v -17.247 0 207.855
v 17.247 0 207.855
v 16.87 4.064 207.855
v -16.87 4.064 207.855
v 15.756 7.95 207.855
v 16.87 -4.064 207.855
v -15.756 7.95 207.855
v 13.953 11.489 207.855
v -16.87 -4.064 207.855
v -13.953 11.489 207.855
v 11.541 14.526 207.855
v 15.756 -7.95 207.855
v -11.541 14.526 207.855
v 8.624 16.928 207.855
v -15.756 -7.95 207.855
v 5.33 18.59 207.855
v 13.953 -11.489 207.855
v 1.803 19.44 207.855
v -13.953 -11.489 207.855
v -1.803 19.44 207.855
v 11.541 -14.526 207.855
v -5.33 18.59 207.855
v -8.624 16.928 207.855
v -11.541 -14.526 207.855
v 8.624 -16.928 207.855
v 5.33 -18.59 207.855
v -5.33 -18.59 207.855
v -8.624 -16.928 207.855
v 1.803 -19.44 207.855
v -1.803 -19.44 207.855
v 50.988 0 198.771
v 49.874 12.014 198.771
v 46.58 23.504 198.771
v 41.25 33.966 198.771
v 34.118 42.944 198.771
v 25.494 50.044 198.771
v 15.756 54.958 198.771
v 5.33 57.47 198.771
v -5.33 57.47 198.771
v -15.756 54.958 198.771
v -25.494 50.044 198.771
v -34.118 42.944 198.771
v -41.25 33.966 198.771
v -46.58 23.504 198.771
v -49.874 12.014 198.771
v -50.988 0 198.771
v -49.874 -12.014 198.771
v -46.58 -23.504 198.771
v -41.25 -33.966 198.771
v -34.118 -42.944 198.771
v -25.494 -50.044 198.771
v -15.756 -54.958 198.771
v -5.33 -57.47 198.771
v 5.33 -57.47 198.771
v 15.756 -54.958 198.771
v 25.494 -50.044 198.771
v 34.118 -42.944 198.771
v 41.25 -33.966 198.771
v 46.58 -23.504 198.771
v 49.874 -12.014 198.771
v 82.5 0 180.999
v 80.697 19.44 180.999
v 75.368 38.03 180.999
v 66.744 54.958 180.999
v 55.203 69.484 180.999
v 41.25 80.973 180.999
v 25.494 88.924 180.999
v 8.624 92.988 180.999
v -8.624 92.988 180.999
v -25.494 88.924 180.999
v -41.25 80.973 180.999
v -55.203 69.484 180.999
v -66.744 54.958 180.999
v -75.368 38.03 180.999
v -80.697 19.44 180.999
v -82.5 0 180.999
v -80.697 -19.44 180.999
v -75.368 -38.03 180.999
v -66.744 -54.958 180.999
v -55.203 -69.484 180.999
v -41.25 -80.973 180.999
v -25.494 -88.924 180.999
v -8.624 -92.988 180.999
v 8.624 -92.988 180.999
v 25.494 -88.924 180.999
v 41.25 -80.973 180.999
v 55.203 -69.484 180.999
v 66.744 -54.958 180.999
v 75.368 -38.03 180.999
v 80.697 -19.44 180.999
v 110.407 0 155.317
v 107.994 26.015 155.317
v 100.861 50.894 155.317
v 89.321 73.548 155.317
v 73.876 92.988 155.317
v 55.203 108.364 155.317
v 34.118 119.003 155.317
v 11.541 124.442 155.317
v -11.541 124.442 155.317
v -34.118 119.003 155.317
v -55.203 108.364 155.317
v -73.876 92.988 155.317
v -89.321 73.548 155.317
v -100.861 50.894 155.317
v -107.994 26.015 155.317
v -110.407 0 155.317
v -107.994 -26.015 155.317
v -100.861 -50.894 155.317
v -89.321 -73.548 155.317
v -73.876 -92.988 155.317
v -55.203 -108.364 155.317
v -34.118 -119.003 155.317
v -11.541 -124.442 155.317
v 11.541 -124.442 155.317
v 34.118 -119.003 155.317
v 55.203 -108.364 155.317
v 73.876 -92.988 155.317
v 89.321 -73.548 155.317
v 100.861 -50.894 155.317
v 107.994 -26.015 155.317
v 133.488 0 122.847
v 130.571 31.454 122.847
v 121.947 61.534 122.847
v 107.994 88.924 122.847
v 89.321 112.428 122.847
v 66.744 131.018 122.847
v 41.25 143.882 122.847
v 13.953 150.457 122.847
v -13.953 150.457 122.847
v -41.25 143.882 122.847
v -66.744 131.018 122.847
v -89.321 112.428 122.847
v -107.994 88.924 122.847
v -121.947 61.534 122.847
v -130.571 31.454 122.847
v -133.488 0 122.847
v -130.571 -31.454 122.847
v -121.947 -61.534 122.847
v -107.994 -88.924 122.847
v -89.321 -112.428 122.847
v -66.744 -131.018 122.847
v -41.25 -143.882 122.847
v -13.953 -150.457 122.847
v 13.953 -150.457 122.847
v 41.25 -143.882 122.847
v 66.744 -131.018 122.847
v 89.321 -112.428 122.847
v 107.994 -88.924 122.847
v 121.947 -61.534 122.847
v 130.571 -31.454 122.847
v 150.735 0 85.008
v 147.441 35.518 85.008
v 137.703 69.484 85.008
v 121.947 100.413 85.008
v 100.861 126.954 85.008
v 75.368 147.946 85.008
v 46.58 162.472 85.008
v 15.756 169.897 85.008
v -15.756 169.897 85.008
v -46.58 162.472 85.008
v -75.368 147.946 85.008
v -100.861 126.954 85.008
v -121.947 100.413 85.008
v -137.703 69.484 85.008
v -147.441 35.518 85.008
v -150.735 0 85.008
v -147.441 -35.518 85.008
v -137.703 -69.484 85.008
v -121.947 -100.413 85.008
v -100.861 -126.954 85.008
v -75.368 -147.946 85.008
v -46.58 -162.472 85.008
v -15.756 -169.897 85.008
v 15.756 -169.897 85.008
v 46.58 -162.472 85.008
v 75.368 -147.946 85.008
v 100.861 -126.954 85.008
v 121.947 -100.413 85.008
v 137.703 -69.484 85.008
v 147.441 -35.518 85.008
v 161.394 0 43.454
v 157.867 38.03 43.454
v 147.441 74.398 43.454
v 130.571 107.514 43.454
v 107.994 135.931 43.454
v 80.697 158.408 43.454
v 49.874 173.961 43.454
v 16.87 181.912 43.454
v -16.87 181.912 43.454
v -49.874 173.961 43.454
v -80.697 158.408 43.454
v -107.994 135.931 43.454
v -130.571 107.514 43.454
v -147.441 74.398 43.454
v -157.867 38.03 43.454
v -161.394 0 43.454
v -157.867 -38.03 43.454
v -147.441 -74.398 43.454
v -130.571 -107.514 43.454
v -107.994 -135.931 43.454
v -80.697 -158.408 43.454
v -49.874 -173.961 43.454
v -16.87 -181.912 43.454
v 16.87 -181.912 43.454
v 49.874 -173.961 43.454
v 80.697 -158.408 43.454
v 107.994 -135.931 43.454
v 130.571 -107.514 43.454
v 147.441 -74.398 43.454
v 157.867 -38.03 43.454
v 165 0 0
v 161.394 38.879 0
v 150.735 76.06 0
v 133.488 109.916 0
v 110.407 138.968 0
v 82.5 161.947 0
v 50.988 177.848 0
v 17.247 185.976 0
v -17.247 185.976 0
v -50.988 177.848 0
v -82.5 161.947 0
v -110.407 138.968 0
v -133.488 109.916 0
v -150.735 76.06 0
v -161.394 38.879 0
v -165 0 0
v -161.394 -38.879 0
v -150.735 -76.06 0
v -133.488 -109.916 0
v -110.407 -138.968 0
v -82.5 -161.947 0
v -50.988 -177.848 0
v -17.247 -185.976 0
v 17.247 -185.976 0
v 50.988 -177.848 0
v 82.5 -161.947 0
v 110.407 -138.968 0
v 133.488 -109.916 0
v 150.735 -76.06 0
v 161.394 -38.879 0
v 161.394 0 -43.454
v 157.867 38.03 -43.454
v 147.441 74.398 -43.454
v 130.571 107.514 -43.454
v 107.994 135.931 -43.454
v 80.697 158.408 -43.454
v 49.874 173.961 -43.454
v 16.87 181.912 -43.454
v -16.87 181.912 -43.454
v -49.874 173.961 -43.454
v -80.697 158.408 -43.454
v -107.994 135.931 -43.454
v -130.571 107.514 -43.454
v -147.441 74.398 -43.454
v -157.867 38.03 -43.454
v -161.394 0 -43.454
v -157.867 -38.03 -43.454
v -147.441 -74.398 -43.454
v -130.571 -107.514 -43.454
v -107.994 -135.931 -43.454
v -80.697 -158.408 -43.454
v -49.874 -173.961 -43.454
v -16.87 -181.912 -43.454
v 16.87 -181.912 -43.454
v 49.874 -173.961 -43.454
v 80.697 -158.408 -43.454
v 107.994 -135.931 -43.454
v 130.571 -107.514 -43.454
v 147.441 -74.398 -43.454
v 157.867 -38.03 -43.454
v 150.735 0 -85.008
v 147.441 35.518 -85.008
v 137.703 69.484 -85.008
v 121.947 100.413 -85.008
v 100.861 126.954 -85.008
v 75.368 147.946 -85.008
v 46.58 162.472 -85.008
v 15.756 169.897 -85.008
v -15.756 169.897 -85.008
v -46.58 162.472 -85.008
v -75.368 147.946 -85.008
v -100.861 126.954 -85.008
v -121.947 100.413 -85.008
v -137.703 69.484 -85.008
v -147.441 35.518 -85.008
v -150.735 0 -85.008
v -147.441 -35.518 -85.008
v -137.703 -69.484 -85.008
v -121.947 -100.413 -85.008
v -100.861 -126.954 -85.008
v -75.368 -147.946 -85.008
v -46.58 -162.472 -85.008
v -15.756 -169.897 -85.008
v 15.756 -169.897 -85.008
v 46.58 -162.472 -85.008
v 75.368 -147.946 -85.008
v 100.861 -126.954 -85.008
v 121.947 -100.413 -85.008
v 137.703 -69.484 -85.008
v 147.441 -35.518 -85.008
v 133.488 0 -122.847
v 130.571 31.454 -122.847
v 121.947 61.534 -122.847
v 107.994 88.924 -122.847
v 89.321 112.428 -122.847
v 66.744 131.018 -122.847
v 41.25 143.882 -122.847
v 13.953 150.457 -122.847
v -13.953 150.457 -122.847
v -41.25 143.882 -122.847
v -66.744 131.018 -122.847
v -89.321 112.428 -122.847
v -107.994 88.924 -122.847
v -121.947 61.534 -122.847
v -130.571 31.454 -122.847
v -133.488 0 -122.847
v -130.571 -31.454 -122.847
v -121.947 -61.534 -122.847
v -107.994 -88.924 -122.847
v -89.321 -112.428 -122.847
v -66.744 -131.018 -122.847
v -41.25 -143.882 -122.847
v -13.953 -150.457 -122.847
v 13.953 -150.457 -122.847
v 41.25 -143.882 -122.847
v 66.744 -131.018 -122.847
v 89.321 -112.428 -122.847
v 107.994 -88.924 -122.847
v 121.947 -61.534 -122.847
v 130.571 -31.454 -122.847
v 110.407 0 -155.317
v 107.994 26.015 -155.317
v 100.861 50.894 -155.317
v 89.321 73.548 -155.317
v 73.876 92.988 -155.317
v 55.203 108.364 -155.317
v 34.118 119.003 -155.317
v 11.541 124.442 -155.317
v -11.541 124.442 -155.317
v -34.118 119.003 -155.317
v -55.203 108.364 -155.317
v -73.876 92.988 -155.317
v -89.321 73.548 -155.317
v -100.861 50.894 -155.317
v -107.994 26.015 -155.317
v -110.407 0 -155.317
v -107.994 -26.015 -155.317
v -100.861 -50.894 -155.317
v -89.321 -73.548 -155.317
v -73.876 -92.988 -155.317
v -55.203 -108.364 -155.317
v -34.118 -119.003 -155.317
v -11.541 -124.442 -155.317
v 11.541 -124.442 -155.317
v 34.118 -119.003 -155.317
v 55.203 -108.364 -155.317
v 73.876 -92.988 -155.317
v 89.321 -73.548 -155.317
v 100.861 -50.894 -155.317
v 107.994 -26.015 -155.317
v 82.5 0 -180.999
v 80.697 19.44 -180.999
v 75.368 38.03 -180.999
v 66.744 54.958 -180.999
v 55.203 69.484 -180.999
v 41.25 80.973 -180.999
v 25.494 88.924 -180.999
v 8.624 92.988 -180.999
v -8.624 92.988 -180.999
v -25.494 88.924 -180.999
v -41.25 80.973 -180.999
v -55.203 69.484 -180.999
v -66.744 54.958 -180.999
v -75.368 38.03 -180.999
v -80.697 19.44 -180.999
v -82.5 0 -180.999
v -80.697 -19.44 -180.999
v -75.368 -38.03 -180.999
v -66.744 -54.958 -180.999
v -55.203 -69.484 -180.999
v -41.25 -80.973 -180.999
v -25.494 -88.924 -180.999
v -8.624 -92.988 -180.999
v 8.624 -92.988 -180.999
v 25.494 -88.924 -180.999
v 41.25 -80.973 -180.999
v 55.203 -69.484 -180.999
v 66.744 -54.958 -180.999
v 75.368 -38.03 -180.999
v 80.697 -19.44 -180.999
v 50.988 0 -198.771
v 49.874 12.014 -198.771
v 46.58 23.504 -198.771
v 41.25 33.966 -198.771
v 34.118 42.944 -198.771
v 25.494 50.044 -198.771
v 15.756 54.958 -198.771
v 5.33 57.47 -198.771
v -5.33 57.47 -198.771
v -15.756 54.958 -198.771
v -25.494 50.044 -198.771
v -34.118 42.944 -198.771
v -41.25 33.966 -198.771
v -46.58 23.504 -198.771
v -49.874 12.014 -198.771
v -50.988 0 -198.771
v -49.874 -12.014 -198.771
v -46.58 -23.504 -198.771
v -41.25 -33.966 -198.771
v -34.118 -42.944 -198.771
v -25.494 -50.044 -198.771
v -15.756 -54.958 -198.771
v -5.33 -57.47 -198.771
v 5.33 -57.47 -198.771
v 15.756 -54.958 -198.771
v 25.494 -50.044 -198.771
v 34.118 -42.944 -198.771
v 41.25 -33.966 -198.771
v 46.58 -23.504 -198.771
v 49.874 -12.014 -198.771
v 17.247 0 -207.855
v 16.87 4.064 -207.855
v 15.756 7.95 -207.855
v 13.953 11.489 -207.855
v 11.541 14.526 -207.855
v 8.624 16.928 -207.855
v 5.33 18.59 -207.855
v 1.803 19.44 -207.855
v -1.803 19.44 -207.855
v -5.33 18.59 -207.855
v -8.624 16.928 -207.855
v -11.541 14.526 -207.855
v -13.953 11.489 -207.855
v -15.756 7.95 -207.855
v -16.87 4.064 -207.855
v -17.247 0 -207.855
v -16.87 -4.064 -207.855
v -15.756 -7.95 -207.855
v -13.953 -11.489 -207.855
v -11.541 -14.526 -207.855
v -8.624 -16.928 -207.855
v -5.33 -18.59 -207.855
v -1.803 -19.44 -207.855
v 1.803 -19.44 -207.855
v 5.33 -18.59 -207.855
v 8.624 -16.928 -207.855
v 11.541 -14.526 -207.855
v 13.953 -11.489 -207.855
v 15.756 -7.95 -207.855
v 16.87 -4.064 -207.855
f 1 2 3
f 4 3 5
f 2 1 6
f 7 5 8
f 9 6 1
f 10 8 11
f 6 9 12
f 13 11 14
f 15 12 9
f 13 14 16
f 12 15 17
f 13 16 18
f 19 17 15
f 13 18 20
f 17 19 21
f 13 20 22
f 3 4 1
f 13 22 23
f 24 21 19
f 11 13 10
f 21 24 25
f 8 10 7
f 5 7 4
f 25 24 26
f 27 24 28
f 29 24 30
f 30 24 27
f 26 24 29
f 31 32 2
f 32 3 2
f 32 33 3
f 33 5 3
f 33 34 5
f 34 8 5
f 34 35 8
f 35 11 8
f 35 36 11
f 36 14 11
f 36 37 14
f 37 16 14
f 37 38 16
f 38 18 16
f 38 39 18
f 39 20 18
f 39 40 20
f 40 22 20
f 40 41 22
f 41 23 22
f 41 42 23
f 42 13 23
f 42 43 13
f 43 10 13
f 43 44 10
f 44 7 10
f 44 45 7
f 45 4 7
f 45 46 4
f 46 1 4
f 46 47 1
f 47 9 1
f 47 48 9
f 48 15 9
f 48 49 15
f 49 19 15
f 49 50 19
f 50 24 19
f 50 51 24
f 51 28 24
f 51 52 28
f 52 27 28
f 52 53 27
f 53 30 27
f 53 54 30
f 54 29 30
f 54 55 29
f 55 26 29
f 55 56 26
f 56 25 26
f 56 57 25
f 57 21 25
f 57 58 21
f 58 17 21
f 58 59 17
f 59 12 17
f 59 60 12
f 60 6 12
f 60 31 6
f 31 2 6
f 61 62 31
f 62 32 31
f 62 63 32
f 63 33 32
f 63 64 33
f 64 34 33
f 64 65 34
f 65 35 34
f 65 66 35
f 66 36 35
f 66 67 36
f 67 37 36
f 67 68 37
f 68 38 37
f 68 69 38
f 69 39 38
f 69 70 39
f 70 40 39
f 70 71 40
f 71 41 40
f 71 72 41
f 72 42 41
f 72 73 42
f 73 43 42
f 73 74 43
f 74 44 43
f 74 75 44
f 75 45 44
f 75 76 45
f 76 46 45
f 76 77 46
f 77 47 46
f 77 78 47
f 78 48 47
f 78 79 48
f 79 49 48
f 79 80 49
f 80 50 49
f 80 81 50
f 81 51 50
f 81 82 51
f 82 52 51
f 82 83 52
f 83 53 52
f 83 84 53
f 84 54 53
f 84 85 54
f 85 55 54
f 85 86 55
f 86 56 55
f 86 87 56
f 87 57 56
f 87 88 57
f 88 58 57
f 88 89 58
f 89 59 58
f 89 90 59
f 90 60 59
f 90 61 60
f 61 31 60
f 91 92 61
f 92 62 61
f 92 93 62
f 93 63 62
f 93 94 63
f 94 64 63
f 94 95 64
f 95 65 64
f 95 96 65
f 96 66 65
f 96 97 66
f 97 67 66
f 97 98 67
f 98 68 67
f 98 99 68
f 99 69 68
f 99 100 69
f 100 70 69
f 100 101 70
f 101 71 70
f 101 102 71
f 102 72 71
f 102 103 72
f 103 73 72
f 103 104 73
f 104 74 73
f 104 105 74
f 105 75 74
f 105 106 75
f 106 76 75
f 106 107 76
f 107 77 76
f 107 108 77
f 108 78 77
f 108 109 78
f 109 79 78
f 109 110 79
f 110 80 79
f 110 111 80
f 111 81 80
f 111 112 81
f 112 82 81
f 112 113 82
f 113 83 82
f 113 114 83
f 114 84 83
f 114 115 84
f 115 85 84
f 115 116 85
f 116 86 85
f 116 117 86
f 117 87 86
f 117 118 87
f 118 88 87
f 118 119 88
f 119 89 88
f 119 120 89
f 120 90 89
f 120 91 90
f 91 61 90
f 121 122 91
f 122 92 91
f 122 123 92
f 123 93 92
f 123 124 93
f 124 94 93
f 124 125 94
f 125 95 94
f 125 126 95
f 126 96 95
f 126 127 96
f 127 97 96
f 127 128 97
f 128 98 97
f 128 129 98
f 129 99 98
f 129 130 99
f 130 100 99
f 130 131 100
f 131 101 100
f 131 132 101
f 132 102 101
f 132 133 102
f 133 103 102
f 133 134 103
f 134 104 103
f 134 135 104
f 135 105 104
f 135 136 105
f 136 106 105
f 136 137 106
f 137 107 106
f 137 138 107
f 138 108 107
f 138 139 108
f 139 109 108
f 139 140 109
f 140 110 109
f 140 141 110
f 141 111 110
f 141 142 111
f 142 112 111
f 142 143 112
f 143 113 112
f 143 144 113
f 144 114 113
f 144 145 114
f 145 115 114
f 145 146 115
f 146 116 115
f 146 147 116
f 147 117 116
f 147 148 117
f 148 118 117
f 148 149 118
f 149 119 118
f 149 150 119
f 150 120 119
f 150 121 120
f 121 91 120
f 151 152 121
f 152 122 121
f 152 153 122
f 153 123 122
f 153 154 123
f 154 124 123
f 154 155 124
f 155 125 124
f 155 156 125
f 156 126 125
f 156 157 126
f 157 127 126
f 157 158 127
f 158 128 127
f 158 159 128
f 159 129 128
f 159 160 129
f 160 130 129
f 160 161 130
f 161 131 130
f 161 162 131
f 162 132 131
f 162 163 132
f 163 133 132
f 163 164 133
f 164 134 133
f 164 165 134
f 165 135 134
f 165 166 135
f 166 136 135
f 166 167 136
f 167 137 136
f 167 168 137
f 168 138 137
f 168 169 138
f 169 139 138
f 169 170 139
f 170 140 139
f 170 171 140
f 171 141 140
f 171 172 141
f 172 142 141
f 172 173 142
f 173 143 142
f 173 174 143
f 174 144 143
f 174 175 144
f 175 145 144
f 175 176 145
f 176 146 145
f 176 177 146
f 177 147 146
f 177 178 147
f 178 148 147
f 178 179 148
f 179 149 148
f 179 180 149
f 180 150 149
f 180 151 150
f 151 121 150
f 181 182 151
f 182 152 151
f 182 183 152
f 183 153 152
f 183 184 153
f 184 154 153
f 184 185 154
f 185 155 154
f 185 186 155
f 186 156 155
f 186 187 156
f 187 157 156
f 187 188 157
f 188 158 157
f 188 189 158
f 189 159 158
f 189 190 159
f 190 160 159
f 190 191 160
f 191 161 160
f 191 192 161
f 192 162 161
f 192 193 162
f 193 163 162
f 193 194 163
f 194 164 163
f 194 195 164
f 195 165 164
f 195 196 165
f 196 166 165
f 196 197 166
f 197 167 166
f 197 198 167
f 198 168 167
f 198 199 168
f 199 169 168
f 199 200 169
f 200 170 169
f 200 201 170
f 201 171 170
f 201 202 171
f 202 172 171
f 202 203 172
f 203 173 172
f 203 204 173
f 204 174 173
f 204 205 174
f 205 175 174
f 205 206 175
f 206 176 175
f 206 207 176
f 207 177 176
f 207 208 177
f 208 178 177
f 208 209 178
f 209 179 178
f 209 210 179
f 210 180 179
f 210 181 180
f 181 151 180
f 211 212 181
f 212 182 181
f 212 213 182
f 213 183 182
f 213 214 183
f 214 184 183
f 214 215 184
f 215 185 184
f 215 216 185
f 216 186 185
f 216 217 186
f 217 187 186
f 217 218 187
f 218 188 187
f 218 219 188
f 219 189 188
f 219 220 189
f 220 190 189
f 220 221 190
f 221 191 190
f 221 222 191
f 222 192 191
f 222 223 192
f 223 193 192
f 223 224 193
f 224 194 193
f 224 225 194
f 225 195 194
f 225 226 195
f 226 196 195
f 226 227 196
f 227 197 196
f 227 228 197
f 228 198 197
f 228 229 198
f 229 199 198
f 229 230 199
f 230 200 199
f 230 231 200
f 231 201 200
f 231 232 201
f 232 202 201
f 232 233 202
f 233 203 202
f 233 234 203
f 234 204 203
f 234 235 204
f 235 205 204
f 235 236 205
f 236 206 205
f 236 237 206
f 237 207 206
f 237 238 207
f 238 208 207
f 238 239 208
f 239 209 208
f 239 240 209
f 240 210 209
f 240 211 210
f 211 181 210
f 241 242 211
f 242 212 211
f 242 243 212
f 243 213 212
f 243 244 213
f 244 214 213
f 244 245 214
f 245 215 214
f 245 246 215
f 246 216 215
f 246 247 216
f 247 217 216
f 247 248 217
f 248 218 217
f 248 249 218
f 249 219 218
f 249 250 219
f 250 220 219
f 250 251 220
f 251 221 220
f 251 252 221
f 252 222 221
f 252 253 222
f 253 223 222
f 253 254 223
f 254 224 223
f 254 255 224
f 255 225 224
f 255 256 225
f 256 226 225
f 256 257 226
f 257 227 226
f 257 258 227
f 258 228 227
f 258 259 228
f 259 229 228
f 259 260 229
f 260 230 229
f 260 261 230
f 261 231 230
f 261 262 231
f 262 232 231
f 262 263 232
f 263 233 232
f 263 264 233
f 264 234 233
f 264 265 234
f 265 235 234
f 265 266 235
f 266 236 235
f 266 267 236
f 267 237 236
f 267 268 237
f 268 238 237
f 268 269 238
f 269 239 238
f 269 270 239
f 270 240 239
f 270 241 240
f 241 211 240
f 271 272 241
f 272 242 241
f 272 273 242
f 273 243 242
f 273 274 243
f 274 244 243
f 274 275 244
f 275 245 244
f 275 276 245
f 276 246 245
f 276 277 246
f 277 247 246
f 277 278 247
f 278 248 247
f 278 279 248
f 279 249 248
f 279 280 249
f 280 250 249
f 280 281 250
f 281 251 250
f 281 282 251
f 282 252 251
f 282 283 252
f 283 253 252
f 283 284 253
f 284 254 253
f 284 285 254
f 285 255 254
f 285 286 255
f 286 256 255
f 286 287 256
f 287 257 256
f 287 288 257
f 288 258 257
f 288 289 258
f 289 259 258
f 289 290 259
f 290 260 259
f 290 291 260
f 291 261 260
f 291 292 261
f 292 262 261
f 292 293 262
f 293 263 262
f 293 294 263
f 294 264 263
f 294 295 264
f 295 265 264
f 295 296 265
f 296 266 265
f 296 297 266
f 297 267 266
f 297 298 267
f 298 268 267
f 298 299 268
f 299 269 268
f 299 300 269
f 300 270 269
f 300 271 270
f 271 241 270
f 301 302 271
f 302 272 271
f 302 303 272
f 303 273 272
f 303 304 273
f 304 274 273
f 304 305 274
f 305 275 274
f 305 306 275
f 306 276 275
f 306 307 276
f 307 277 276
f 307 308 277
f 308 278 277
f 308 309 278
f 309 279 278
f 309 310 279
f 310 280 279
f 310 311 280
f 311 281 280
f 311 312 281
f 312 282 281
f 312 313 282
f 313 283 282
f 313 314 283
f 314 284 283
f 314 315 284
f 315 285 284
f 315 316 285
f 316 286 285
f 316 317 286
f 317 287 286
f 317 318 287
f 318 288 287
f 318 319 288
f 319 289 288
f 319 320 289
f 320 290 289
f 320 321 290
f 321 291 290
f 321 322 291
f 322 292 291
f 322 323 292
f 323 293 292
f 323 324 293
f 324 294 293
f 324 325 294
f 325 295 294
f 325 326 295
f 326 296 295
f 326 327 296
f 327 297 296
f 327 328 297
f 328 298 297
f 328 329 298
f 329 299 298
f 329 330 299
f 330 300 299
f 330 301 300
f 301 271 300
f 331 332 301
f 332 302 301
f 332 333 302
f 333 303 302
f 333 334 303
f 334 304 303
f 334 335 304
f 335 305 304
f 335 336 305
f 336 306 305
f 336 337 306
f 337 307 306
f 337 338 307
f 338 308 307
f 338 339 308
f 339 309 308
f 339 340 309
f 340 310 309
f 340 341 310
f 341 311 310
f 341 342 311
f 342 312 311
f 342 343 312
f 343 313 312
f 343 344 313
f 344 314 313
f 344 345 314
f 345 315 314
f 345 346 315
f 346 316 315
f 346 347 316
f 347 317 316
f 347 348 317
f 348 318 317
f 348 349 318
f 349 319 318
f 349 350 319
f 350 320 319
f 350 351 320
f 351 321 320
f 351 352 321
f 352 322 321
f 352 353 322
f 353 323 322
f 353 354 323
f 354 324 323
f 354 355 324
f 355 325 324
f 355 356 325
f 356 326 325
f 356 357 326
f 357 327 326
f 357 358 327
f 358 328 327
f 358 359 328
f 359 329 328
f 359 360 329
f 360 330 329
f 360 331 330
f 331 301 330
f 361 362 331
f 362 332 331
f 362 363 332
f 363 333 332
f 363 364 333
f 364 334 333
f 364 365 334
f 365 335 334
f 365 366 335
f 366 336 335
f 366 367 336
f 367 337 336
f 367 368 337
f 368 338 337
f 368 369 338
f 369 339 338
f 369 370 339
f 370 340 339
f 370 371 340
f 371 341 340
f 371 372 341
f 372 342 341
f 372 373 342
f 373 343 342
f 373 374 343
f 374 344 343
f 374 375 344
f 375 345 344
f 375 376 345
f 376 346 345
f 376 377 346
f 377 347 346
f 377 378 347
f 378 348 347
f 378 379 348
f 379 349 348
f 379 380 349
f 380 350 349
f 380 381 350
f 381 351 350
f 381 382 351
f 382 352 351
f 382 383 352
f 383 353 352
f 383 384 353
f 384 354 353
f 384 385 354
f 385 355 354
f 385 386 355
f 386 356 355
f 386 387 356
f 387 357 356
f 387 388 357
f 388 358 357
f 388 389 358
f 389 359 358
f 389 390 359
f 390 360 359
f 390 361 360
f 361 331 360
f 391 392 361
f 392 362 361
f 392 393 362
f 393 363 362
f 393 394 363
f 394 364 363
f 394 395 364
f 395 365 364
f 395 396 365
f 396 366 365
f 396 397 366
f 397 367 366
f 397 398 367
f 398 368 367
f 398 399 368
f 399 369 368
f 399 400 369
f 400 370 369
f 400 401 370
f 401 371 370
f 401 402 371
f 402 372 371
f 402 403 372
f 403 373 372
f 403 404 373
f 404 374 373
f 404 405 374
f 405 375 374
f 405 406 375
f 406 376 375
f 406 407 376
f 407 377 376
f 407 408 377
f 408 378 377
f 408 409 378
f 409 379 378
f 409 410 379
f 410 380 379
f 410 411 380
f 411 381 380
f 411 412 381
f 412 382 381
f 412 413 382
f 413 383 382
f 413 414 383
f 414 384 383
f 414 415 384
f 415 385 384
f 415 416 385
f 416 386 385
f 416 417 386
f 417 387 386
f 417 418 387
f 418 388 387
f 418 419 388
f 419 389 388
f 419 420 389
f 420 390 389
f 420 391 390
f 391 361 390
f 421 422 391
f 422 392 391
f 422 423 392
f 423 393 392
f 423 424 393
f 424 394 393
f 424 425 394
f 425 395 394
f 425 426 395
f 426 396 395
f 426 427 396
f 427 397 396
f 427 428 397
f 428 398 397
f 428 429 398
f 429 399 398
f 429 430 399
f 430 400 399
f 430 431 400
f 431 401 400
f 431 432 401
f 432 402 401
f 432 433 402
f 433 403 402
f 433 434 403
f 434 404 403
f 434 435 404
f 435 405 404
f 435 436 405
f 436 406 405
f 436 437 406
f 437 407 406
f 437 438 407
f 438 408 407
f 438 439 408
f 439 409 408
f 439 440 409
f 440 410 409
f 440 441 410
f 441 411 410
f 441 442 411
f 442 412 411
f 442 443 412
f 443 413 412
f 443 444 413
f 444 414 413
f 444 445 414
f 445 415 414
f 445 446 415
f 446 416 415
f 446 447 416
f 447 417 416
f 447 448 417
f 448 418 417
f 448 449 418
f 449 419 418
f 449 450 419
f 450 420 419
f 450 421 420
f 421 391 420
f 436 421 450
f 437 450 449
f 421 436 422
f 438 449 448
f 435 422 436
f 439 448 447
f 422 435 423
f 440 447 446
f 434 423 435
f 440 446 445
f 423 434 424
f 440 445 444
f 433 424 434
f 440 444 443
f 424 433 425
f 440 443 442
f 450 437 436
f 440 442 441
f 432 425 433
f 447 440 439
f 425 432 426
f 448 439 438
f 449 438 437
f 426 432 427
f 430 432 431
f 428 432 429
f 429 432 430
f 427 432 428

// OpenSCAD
// Generated by SolidPython 1.0.1 on 2020-07-29 00:46:52


scale(v = [15, 17, 19]) {
	sphere(r = 11);
}
/***********************************************
*********      SolidPython code:      **********
************************************************
 
# import packages: SolidPython
from solid import *
from solid.utils import *
from itertools import chain, combinations, permutations


class Resize:

    def __init__(self, scad_file):
        self.scad_file = scad_file
        #self.scad_file = import_scad(scad_file)
        # cone/cylinder param:
        self.r1 = 0
        self.r2 = 0
        self.h = 0
        # rectangular prism param:
        self.w = 0
        self.l = 0
        # ellipse param:
        self.r = 0

    # import OpenScad code (file name corresponds to shape)


    # classify shape + parameters
    def assign(self, param1, param2, param3):
        if self.scad_file == 'cone.scad':
            self.r1 = param1
            self.r2 = param2
            self.h = param3
        elif self.scad_file == 'cylinder.scad':
            self.r1 = param1
            self.r2 = param2
            self.h = param3
        elif self.scad_file == 'rectangularPrism.scad':
            self.h = param1
            self.l = param2
            self.w = param3
        else:
            self.r = param1
            self.h = param2

    # resize parameters
    def iterate(self):
        x = range(3, 20, 2)
        i = 1
        if self.scad_file == 'cone.scad':
            tempList = list(permutations(x, 2))
            for temp in tempList:
                param1 = temp[0]
                param2 = temp[1]
                filepath = 'produced_scad_files/' + 'cone' + str(param1) + '_' + str(param2) + '_' + '.scad'
                scad_render_to_file(cylinder(h=param1, r1=param2, r2=0), filepath)

        elif self.scad_file == 'cylinder.scad':
            tempList = list(permutations(x, 3))
            for temp in tempList:
                param1 = temp[0]
                param2 = temp[1]
                filepath = 'produced_scad_files/' + 'cylinder' + str(param1) + '_' + str(param2) + '_' + '.scad'
                scad_render_to_file(cylinder(h=param1, r1=param2, r2=param2), filepath)

        elif self.scad_file == 'rectangularPrism.scad':
            tempList = list(permutations(x, 3))
            for temp in tempList:
                param1 = temp[0]
                param2 = temp[1]
                param3 = temp[2]
                filepath = 'produced_scad_files/' + 'rectangularPrism' + str(param1) + '_' + str(param2) + '_' + str(
                    param3) + '.scad'
                scad_render_to_file(cube(size=(param1, param2, param3)), filepath)

        elif self.scad_file == 'ellipse.scad':
            tempList = list(permutations(x, 4))
            for temp in tempList:
                param1 = temp[0]
                param2 = temp[1]
                param3 = temp[2]
                param4 = temp[3]
                filepath = 'produced_scad_files/' + 'ellipse' + str(param1) + '_' + str(param2) + '_' + str(param3) + '_' + str(param4) + '.scad'
                scad_render_to_file(scale([param1, param2, param3])(sphere(r=param4)), filepath)

    def render_to_scadfile(self):
        scad_render_to_file(scad, 'example.scad') 
 
************************************************/
